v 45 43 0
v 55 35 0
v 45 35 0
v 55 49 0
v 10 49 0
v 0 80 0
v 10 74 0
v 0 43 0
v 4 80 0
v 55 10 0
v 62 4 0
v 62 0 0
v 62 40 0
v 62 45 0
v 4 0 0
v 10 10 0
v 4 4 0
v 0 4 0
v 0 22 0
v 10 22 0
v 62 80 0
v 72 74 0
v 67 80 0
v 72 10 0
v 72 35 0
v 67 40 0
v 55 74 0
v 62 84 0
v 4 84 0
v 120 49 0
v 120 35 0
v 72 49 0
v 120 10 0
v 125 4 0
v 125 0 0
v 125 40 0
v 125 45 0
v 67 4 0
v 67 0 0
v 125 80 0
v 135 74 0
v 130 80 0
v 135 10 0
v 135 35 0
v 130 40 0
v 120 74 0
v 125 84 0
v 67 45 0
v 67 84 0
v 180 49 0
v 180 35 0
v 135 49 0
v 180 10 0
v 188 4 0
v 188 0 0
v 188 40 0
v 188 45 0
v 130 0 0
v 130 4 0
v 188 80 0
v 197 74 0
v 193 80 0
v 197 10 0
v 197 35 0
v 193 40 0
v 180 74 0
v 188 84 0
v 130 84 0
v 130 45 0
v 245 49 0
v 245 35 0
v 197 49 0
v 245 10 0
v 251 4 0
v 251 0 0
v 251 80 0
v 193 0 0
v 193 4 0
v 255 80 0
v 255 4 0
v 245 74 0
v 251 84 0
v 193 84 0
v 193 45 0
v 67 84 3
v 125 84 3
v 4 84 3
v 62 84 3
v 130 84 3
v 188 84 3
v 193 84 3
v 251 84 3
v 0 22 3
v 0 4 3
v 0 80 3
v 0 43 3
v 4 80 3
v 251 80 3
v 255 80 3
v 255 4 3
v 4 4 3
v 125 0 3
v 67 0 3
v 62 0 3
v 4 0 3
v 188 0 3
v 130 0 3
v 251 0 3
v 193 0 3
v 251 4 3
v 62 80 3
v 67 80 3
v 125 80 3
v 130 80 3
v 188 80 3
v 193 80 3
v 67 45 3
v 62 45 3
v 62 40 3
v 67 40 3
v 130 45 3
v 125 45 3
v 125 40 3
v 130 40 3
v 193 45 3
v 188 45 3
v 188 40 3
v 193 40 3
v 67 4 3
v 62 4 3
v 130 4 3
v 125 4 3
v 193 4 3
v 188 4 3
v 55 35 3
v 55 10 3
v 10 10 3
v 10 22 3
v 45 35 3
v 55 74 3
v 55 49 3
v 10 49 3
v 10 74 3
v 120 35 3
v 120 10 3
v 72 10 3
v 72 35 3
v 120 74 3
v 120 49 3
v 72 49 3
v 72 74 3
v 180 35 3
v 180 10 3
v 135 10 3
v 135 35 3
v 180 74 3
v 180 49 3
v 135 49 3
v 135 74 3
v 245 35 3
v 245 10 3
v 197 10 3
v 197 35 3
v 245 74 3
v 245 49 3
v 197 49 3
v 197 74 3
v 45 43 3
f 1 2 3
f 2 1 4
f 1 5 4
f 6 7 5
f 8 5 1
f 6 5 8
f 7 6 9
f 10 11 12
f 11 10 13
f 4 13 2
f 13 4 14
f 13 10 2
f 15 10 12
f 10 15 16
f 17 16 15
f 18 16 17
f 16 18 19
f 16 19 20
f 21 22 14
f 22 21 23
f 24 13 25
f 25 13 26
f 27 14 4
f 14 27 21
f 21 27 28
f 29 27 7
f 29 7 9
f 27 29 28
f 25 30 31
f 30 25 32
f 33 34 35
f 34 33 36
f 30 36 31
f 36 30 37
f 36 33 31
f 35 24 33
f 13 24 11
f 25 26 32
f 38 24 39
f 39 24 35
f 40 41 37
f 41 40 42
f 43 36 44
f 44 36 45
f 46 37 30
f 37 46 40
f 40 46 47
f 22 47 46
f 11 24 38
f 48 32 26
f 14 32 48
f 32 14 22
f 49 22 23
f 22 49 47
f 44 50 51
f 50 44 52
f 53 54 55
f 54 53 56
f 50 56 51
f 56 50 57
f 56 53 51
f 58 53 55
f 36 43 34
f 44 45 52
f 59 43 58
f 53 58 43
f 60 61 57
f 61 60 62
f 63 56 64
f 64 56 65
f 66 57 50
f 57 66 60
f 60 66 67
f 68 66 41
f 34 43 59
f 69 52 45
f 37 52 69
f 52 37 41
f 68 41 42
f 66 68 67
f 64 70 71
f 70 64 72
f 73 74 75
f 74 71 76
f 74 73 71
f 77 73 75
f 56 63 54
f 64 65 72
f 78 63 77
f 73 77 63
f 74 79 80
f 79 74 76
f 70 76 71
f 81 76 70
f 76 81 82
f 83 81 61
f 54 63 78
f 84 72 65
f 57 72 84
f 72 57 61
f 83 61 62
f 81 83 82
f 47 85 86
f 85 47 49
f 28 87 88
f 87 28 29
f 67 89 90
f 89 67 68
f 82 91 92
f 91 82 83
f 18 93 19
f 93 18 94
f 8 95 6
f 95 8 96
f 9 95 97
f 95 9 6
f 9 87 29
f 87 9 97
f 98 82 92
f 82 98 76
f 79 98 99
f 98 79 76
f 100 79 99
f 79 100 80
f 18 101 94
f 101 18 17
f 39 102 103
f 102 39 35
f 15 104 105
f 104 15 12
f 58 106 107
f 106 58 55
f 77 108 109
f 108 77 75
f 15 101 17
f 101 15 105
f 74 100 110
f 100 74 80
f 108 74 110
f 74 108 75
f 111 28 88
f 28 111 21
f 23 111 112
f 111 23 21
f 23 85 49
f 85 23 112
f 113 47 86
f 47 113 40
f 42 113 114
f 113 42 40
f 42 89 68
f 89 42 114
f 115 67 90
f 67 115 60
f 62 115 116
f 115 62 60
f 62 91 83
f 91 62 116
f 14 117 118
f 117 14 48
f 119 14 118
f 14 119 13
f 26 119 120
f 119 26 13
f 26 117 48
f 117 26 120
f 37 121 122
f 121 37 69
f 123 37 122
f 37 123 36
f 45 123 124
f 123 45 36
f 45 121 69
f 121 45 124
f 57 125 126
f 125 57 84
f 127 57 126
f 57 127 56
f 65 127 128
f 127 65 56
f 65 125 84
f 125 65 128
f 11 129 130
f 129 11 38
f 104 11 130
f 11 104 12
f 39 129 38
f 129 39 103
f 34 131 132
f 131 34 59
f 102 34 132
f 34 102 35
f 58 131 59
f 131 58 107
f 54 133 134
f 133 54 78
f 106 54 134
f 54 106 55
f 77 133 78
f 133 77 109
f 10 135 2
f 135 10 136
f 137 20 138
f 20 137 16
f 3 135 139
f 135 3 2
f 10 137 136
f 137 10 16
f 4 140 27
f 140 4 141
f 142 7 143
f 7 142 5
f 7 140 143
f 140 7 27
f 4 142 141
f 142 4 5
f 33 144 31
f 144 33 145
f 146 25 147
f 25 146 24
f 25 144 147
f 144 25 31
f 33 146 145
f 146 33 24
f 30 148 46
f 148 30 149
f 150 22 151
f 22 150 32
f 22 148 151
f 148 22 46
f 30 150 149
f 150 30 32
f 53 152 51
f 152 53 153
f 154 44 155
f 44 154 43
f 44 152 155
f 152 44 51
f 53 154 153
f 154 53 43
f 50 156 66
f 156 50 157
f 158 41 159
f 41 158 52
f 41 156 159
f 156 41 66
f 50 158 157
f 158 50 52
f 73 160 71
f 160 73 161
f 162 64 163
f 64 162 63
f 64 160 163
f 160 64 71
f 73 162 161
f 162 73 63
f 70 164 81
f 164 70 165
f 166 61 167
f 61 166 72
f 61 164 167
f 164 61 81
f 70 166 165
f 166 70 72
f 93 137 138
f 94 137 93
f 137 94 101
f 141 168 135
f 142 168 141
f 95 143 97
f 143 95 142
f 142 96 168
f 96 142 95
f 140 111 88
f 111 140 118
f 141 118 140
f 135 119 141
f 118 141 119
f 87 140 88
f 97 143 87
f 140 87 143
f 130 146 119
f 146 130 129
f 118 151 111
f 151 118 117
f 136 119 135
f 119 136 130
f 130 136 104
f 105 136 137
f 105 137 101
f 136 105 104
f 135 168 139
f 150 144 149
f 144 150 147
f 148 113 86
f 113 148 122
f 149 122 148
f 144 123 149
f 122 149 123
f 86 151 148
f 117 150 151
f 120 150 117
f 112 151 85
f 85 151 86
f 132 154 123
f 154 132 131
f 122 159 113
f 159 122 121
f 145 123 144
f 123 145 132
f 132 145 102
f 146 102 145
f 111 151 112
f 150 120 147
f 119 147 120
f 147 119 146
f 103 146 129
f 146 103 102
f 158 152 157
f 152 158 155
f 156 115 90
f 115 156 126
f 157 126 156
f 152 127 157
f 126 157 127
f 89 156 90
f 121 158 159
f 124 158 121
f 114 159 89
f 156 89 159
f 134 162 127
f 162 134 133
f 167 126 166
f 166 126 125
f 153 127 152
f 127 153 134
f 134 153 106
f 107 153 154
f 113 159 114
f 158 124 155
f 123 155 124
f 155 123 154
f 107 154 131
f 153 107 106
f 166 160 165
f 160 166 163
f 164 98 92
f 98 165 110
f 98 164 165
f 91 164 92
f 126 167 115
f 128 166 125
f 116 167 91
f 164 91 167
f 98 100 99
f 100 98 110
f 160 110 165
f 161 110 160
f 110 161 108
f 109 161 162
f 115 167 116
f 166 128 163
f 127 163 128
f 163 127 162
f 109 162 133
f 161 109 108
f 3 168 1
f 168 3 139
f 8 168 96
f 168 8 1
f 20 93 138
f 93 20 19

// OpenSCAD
// Filler plate for the TG4X

// Keyboard dimensions
KBD_WIDTH = 255;
KBD_HEIGHT = 84;

// Used to automatically render each half to a different STL file
ENABLE_HALVES = [ true, true ];

module place_standoff_holes(x = 5, y = 4) {
  linear_extrude(height = 10) {
    // Left
    translate([ 62, 0, 0 ]) square([ x, y ]);
    // Middle
    translate([ 125, 0, 0 ]) square([ x, y ]);
    // Right
    translate([ 188, 0, 0 ]) square([ x, y ]);
  }
}

// Used to slice the model into halves for printing
difference() {
  // Model
  difference() {
    // Keyboard bounds
    cube([ KBD_WIDTH, KBD_HEIGHT, 3 ]);

    // Cut out the standoff holes
    union() {
      // Corner cuts
      linear_extrude(height = 10) {
        // Top left
        translate([ 0, 80, 0 ]) square([ 4, 4 ]);
        // Bottom left
        translate([ 0, 0, 0 ]) square([ 4, 4 ]);
        // Top right
        translate([ 251, 80, 0 ]) square([ 4, 4 ]);
        // Bottom right
        translate([ 251, 0, 0 ]) square([ 4, 4 ]);
      }

      // Centeral standoff holes
      translate([ 0, 80, 0 ]) place_standoff_holes();
      translate([ 0, 40, 0 ]) place_standoff_holes(y = 5);
      translate([ 0, 0, 0 ]) place_standoff_holes();
    }

    // Cut out a space for the controller
    translate([ 0, 22, 0 ]) cube([ 45, 21, 10 ]);

    // Removal of unnecessary material
    union() {
      // Section 1
      union() {
        translate([ 10, 10, 0 ]) cube([ 45, 25, 10 ]);
        translate([ 10, KBD_HEIGHT - 10 - 25, 0 ]) cube([ 45, 25, 10 ]);
      }
      // Section 2
      union() {
        translate([ 72, 10, 0]) cube([ 48, 25, 10 ]);
        translate([ 72, KBD_HEIGHT - 10 - 25, 0 ]) cube([ 48, 25, 10 ]);
      }
      // Section 3
      union() {
        translate([ 135, 10, 0 ]) cube([ 45, 25, 10 ]);
        translate([ 135, KBD_HEIGHT - 10 - 25, 0 ]) cube([ 45, 25, 10 ]);
      }
      // Section 4
      union() {
        translate([ 197, 10, 0 ]) cube([ 48, 25, 10 ]);
        translate([ 197, KBD_HEIGHT - 10 - 25, 0 ]) cube([ 48, 25, 10 ]);
      }
    }
  }

  // Slicing functionality
  if (!ENABLE_HALVES[0]) {
    translate([ 0, 0, 0 ]) cube([ KBD_WIDTH / 2, KBD_HEIGHT, 10 ]);
  }
  if (!ENABLE_HALVES[1]) {
    translate([ KBD_WIDTH / 2, 0, 0 ]) cube([ KBD_WIDTH / 2, KBD_HEIGHT, 10 ]);
  }
}
